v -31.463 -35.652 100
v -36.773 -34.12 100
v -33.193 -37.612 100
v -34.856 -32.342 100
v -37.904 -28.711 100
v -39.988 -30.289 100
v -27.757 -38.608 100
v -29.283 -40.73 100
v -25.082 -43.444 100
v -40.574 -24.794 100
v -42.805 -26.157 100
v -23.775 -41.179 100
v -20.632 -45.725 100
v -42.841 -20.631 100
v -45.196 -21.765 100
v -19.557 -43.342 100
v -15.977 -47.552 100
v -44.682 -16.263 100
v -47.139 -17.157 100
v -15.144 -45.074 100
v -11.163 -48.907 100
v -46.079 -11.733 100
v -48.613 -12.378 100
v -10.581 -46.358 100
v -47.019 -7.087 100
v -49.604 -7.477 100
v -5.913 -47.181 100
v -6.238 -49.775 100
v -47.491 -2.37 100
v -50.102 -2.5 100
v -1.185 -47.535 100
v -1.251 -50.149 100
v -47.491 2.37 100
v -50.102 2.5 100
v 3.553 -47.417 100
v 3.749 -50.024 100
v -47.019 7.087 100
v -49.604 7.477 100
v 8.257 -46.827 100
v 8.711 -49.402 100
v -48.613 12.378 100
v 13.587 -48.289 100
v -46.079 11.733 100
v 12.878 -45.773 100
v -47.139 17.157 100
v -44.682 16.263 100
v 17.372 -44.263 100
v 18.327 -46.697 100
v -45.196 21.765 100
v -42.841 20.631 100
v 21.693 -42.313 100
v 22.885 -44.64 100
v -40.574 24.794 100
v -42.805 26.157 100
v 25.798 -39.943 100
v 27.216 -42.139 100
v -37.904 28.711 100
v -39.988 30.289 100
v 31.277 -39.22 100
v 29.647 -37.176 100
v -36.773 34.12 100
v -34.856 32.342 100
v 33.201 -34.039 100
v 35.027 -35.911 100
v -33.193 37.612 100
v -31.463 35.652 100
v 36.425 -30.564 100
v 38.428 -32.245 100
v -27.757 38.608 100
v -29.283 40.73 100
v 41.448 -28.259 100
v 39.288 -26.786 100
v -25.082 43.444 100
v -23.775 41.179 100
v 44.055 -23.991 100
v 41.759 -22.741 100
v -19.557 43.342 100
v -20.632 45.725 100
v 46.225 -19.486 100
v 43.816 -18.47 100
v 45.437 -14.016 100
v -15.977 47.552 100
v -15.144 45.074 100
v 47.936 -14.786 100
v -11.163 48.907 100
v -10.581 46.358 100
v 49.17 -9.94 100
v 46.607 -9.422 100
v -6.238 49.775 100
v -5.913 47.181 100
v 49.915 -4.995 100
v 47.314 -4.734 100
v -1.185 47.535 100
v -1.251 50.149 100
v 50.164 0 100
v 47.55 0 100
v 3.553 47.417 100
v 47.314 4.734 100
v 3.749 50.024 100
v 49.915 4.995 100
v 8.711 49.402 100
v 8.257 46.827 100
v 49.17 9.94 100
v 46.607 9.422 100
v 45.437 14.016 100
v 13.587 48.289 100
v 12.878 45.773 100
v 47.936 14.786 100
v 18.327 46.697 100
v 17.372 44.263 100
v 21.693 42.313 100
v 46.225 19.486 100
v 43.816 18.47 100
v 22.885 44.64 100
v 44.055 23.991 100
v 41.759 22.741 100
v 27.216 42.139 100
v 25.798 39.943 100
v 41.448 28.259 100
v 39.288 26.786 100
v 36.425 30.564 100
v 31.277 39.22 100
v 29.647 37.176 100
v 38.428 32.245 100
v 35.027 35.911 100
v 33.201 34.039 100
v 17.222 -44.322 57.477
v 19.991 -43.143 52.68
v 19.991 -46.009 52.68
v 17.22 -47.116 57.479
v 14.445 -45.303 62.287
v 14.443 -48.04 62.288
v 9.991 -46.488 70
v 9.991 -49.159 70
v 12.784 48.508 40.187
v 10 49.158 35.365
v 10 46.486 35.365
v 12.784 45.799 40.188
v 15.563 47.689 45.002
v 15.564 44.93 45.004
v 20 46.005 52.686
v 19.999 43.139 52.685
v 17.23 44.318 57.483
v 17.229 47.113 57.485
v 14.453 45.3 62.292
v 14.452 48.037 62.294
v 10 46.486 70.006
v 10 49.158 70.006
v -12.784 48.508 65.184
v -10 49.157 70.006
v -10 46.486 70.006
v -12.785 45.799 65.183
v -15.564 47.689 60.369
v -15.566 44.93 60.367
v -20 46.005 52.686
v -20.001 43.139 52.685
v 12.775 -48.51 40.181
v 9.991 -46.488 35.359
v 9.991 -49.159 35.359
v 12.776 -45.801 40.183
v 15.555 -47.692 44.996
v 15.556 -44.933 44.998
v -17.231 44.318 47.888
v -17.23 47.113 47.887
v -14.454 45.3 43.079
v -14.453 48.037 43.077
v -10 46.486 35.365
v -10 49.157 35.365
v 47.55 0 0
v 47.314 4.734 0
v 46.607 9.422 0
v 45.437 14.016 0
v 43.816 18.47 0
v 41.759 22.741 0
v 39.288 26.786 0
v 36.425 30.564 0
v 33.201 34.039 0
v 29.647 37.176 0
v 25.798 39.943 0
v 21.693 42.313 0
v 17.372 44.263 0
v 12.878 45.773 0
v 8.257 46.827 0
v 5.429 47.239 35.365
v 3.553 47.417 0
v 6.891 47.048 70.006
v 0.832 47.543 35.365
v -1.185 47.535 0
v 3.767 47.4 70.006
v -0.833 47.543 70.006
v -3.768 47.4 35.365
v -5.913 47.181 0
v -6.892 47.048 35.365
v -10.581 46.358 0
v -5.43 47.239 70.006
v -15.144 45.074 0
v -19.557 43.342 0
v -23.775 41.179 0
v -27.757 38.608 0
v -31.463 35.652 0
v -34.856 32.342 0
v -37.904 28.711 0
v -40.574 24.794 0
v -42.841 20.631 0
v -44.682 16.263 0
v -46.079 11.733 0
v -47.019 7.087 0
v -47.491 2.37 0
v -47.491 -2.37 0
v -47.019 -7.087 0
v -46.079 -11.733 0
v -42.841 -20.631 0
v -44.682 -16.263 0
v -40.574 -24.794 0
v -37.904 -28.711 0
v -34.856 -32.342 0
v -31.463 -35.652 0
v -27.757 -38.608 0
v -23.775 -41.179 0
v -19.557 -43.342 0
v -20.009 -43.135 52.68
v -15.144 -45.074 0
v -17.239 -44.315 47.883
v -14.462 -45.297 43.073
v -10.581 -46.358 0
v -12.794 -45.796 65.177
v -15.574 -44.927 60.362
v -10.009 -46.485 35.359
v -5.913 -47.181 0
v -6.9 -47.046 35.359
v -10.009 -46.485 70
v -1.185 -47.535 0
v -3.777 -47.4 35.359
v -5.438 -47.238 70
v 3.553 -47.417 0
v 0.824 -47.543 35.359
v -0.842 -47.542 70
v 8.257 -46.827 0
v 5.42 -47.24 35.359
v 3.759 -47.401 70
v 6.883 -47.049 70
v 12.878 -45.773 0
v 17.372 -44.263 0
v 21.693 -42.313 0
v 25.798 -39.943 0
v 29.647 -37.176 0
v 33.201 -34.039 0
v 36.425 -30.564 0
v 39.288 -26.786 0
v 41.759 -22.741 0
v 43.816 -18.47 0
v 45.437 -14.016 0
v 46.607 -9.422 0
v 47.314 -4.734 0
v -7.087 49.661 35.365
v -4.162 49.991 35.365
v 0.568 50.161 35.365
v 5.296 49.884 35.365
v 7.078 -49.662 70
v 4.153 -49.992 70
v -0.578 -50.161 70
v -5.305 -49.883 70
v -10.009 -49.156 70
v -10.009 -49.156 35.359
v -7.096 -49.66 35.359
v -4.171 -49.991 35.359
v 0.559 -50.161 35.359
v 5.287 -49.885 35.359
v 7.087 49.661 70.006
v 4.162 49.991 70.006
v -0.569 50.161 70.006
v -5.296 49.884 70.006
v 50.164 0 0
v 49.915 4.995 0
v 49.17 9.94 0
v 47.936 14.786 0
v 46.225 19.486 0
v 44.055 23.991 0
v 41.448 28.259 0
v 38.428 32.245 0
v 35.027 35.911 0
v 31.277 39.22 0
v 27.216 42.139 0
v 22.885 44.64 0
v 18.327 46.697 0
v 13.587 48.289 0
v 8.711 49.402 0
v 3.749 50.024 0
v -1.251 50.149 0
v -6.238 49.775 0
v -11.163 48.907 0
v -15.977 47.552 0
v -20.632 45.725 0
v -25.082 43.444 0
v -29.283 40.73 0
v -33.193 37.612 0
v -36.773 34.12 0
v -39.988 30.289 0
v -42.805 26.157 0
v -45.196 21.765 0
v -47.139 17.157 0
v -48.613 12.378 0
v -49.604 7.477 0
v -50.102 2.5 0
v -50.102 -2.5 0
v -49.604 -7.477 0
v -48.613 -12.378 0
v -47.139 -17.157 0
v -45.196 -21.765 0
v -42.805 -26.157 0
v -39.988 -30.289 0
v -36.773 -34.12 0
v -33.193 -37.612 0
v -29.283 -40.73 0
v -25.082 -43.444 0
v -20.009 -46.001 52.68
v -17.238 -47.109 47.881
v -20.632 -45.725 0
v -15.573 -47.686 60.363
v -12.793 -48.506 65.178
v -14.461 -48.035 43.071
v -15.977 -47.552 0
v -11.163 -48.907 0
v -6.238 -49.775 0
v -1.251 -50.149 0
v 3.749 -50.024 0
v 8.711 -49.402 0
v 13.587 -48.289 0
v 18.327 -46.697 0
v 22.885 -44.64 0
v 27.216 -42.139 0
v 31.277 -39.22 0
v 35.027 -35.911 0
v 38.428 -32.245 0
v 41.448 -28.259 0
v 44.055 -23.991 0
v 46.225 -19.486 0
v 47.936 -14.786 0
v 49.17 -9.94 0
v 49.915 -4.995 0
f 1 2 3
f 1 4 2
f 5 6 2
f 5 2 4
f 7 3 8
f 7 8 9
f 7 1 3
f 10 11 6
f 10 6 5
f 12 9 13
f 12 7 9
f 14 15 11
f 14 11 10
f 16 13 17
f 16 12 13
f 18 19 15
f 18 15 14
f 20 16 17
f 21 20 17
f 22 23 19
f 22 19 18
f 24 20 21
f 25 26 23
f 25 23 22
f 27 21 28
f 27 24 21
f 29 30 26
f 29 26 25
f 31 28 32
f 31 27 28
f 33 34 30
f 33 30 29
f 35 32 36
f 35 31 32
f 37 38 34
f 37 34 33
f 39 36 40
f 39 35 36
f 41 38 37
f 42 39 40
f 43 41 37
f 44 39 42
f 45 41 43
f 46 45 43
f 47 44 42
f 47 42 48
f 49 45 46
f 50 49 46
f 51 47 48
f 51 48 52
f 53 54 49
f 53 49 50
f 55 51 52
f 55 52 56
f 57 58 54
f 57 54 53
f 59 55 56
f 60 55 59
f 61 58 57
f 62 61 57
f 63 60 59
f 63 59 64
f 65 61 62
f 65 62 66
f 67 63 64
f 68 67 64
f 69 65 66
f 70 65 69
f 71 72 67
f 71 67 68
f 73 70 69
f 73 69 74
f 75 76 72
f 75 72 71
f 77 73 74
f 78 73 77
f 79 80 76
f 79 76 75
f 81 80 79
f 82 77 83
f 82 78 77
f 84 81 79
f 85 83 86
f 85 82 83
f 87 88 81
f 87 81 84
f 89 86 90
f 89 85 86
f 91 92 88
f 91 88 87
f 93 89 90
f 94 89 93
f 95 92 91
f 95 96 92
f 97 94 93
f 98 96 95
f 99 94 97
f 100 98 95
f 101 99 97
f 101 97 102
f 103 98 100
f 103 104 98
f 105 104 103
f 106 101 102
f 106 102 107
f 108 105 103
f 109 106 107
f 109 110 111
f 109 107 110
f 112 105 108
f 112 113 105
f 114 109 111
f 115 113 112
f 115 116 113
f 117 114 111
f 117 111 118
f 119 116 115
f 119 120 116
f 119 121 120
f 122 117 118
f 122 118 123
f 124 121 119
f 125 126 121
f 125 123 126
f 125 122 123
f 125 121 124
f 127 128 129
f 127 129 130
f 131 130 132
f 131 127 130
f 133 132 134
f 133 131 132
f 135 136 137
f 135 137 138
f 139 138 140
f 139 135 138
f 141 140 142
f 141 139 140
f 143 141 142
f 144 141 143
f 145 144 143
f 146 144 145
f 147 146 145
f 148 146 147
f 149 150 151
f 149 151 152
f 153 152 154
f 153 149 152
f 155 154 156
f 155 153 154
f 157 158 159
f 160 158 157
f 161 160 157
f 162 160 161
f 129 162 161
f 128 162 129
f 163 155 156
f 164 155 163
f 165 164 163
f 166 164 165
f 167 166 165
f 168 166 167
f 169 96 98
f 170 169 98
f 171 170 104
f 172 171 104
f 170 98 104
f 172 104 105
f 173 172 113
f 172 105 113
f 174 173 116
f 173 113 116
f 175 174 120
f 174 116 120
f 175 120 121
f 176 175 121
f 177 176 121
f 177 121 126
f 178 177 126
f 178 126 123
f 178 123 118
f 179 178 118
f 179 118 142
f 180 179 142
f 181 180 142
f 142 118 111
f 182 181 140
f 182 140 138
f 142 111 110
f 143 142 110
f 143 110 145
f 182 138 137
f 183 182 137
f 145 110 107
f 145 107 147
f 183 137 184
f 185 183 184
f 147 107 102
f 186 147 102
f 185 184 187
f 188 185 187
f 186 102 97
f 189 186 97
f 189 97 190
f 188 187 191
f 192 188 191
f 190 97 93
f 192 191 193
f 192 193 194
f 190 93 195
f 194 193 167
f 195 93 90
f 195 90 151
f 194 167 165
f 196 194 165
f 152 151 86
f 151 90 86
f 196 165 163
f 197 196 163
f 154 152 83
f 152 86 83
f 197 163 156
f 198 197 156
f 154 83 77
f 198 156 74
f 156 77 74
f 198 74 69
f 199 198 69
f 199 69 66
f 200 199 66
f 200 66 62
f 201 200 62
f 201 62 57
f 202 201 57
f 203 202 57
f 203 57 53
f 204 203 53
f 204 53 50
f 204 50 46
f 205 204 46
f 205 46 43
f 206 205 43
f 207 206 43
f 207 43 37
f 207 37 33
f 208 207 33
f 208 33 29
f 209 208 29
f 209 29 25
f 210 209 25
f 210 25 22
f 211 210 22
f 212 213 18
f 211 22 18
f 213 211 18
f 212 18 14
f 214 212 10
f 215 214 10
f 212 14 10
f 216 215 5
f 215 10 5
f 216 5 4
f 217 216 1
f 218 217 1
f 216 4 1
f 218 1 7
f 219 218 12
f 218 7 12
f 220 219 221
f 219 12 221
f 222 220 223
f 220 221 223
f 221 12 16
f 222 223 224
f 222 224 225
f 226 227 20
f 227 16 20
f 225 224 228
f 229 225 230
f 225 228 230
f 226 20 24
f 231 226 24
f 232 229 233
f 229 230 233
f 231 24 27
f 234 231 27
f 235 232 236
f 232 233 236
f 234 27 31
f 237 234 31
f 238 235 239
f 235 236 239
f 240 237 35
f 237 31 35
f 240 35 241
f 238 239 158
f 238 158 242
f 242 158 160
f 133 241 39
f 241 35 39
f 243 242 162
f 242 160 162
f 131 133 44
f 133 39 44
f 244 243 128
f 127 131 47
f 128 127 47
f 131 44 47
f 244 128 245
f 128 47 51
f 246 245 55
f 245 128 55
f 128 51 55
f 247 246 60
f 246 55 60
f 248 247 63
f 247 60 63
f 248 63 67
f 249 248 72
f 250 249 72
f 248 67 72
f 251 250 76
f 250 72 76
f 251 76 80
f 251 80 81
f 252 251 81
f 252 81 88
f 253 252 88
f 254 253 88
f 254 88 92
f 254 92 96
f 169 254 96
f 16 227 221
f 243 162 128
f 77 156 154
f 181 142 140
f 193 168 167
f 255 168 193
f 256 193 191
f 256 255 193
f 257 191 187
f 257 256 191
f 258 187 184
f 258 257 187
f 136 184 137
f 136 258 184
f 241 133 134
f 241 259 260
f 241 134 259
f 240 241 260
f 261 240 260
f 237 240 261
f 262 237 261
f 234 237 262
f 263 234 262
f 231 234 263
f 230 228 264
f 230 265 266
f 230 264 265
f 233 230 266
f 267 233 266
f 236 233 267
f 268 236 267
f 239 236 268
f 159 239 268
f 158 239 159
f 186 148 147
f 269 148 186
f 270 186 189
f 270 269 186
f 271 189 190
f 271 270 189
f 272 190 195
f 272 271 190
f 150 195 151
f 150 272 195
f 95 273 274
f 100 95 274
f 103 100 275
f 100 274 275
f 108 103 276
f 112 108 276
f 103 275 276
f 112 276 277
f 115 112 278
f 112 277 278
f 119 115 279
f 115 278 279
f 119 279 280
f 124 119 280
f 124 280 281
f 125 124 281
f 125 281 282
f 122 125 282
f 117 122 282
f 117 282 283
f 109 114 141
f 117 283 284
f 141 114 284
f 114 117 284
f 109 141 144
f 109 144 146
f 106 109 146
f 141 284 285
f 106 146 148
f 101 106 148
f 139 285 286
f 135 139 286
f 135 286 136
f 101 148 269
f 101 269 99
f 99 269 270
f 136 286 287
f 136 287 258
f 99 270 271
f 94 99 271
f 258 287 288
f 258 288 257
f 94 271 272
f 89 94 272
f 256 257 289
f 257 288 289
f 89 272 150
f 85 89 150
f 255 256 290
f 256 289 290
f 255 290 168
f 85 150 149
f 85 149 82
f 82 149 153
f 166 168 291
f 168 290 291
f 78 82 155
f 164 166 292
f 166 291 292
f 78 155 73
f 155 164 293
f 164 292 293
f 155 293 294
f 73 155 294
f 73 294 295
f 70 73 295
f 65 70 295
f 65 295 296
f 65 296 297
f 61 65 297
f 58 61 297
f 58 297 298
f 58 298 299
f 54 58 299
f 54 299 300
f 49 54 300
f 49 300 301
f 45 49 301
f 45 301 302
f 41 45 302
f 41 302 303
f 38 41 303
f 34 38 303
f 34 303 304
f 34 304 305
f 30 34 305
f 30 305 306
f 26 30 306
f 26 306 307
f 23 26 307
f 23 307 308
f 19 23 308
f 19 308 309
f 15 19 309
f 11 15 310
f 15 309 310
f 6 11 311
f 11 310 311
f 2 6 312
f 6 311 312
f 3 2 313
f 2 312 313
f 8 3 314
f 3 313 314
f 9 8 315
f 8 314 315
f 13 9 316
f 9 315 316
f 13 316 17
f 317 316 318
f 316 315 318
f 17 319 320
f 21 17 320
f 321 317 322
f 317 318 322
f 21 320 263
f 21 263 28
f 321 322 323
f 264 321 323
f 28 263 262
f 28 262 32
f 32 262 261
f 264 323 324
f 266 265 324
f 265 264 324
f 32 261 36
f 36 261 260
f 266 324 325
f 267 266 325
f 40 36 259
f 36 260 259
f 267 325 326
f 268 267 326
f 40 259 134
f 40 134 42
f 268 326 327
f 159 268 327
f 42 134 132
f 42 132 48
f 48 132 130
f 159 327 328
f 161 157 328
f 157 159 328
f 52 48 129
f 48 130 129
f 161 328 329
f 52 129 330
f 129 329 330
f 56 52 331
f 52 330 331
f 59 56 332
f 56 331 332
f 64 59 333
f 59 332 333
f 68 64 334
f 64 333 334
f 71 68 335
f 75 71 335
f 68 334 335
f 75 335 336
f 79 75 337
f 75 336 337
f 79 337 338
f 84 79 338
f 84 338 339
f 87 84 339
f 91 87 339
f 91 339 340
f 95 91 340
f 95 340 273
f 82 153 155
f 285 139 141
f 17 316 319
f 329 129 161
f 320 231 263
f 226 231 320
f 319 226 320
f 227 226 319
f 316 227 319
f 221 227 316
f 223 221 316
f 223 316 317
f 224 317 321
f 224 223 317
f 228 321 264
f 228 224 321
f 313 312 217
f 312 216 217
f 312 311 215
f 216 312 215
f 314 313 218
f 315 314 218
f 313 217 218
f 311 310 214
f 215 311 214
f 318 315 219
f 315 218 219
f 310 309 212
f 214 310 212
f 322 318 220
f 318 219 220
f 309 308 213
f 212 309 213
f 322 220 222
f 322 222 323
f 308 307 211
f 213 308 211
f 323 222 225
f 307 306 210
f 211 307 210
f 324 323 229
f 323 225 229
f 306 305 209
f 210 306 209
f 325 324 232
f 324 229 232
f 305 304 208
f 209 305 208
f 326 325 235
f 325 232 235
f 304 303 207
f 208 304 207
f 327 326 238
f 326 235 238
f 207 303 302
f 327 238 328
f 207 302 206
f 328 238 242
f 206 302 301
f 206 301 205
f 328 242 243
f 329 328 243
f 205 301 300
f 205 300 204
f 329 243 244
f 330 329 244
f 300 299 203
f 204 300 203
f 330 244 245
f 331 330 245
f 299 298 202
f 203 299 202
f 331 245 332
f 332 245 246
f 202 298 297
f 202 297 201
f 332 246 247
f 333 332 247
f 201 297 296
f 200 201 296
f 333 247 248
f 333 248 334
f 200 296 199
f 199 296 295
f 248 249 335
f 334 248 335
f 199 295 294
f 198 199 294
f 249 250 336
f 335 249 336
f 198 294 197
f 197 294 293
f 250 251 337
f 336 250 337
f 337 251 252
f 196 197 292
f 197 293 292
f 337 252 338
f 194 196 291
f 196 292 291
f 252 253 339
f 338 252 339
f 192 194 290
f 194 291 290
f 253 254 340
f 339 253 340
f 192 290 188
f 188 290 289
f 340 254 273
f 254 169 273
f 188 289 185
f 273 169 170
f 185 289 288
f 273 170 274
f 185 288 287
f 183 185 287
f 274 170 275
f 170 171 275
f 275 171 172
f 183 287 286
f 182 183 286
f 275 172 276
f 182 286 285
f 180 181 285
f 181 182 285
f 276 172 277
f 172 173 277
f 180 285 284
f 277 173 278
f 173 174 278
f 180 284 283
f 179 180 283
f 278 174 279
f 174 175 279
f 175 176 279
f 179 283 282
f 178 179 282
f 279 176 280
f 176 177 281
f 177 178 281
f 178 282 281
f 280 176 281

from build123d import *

# Parameters (mm, degrees)
SKETCH_R     = 50.164311
PAD_DEPTH    = 100
SKETCH001_R  = 47.549829
POCKET_DEPTH = 100.001


with BuildPart() as part:
    # Sketch → Pad (new body)
    with BuildSketch(Plane.XY):
        Circle(SKETCH_R)
    extrude(amount=PAD_DEPTH)

    # Sketch001 (on Face3 of Pad) → Pocket (cut, through all)
    with BuildSketch(Plane.XY.offset(100)):
        Circle(SKETCH001_R)
    extrude(amount=-POCKET_DEPTH, mode=Mode.SUBTRACT)

    # Sketch003 → SubtractiveLoft section 0
    with BuildSketch(Plane.XZ.offset(51)):
        Polygon((9.990768, 70), (-10.009232, 70), (-20.009232, 52.679492), (-10.009232, 35.358984), (9.990768, 35.358984), (19.990768, 52.679492), align=None)
    # Sketch004 → SubtractiveLoft section 1
    with BuildSketch(Plane.XZ.offset(-51)):
        Polygon((20, 52.685847), (10, 70.006355), (-10, 70.006355), (-20, 52.685847), (-10, 35.365339), (10, 35.365339), align=None)
    loft(ruled=True, mode=Mode.SUBTRACT)


solid = part.part
